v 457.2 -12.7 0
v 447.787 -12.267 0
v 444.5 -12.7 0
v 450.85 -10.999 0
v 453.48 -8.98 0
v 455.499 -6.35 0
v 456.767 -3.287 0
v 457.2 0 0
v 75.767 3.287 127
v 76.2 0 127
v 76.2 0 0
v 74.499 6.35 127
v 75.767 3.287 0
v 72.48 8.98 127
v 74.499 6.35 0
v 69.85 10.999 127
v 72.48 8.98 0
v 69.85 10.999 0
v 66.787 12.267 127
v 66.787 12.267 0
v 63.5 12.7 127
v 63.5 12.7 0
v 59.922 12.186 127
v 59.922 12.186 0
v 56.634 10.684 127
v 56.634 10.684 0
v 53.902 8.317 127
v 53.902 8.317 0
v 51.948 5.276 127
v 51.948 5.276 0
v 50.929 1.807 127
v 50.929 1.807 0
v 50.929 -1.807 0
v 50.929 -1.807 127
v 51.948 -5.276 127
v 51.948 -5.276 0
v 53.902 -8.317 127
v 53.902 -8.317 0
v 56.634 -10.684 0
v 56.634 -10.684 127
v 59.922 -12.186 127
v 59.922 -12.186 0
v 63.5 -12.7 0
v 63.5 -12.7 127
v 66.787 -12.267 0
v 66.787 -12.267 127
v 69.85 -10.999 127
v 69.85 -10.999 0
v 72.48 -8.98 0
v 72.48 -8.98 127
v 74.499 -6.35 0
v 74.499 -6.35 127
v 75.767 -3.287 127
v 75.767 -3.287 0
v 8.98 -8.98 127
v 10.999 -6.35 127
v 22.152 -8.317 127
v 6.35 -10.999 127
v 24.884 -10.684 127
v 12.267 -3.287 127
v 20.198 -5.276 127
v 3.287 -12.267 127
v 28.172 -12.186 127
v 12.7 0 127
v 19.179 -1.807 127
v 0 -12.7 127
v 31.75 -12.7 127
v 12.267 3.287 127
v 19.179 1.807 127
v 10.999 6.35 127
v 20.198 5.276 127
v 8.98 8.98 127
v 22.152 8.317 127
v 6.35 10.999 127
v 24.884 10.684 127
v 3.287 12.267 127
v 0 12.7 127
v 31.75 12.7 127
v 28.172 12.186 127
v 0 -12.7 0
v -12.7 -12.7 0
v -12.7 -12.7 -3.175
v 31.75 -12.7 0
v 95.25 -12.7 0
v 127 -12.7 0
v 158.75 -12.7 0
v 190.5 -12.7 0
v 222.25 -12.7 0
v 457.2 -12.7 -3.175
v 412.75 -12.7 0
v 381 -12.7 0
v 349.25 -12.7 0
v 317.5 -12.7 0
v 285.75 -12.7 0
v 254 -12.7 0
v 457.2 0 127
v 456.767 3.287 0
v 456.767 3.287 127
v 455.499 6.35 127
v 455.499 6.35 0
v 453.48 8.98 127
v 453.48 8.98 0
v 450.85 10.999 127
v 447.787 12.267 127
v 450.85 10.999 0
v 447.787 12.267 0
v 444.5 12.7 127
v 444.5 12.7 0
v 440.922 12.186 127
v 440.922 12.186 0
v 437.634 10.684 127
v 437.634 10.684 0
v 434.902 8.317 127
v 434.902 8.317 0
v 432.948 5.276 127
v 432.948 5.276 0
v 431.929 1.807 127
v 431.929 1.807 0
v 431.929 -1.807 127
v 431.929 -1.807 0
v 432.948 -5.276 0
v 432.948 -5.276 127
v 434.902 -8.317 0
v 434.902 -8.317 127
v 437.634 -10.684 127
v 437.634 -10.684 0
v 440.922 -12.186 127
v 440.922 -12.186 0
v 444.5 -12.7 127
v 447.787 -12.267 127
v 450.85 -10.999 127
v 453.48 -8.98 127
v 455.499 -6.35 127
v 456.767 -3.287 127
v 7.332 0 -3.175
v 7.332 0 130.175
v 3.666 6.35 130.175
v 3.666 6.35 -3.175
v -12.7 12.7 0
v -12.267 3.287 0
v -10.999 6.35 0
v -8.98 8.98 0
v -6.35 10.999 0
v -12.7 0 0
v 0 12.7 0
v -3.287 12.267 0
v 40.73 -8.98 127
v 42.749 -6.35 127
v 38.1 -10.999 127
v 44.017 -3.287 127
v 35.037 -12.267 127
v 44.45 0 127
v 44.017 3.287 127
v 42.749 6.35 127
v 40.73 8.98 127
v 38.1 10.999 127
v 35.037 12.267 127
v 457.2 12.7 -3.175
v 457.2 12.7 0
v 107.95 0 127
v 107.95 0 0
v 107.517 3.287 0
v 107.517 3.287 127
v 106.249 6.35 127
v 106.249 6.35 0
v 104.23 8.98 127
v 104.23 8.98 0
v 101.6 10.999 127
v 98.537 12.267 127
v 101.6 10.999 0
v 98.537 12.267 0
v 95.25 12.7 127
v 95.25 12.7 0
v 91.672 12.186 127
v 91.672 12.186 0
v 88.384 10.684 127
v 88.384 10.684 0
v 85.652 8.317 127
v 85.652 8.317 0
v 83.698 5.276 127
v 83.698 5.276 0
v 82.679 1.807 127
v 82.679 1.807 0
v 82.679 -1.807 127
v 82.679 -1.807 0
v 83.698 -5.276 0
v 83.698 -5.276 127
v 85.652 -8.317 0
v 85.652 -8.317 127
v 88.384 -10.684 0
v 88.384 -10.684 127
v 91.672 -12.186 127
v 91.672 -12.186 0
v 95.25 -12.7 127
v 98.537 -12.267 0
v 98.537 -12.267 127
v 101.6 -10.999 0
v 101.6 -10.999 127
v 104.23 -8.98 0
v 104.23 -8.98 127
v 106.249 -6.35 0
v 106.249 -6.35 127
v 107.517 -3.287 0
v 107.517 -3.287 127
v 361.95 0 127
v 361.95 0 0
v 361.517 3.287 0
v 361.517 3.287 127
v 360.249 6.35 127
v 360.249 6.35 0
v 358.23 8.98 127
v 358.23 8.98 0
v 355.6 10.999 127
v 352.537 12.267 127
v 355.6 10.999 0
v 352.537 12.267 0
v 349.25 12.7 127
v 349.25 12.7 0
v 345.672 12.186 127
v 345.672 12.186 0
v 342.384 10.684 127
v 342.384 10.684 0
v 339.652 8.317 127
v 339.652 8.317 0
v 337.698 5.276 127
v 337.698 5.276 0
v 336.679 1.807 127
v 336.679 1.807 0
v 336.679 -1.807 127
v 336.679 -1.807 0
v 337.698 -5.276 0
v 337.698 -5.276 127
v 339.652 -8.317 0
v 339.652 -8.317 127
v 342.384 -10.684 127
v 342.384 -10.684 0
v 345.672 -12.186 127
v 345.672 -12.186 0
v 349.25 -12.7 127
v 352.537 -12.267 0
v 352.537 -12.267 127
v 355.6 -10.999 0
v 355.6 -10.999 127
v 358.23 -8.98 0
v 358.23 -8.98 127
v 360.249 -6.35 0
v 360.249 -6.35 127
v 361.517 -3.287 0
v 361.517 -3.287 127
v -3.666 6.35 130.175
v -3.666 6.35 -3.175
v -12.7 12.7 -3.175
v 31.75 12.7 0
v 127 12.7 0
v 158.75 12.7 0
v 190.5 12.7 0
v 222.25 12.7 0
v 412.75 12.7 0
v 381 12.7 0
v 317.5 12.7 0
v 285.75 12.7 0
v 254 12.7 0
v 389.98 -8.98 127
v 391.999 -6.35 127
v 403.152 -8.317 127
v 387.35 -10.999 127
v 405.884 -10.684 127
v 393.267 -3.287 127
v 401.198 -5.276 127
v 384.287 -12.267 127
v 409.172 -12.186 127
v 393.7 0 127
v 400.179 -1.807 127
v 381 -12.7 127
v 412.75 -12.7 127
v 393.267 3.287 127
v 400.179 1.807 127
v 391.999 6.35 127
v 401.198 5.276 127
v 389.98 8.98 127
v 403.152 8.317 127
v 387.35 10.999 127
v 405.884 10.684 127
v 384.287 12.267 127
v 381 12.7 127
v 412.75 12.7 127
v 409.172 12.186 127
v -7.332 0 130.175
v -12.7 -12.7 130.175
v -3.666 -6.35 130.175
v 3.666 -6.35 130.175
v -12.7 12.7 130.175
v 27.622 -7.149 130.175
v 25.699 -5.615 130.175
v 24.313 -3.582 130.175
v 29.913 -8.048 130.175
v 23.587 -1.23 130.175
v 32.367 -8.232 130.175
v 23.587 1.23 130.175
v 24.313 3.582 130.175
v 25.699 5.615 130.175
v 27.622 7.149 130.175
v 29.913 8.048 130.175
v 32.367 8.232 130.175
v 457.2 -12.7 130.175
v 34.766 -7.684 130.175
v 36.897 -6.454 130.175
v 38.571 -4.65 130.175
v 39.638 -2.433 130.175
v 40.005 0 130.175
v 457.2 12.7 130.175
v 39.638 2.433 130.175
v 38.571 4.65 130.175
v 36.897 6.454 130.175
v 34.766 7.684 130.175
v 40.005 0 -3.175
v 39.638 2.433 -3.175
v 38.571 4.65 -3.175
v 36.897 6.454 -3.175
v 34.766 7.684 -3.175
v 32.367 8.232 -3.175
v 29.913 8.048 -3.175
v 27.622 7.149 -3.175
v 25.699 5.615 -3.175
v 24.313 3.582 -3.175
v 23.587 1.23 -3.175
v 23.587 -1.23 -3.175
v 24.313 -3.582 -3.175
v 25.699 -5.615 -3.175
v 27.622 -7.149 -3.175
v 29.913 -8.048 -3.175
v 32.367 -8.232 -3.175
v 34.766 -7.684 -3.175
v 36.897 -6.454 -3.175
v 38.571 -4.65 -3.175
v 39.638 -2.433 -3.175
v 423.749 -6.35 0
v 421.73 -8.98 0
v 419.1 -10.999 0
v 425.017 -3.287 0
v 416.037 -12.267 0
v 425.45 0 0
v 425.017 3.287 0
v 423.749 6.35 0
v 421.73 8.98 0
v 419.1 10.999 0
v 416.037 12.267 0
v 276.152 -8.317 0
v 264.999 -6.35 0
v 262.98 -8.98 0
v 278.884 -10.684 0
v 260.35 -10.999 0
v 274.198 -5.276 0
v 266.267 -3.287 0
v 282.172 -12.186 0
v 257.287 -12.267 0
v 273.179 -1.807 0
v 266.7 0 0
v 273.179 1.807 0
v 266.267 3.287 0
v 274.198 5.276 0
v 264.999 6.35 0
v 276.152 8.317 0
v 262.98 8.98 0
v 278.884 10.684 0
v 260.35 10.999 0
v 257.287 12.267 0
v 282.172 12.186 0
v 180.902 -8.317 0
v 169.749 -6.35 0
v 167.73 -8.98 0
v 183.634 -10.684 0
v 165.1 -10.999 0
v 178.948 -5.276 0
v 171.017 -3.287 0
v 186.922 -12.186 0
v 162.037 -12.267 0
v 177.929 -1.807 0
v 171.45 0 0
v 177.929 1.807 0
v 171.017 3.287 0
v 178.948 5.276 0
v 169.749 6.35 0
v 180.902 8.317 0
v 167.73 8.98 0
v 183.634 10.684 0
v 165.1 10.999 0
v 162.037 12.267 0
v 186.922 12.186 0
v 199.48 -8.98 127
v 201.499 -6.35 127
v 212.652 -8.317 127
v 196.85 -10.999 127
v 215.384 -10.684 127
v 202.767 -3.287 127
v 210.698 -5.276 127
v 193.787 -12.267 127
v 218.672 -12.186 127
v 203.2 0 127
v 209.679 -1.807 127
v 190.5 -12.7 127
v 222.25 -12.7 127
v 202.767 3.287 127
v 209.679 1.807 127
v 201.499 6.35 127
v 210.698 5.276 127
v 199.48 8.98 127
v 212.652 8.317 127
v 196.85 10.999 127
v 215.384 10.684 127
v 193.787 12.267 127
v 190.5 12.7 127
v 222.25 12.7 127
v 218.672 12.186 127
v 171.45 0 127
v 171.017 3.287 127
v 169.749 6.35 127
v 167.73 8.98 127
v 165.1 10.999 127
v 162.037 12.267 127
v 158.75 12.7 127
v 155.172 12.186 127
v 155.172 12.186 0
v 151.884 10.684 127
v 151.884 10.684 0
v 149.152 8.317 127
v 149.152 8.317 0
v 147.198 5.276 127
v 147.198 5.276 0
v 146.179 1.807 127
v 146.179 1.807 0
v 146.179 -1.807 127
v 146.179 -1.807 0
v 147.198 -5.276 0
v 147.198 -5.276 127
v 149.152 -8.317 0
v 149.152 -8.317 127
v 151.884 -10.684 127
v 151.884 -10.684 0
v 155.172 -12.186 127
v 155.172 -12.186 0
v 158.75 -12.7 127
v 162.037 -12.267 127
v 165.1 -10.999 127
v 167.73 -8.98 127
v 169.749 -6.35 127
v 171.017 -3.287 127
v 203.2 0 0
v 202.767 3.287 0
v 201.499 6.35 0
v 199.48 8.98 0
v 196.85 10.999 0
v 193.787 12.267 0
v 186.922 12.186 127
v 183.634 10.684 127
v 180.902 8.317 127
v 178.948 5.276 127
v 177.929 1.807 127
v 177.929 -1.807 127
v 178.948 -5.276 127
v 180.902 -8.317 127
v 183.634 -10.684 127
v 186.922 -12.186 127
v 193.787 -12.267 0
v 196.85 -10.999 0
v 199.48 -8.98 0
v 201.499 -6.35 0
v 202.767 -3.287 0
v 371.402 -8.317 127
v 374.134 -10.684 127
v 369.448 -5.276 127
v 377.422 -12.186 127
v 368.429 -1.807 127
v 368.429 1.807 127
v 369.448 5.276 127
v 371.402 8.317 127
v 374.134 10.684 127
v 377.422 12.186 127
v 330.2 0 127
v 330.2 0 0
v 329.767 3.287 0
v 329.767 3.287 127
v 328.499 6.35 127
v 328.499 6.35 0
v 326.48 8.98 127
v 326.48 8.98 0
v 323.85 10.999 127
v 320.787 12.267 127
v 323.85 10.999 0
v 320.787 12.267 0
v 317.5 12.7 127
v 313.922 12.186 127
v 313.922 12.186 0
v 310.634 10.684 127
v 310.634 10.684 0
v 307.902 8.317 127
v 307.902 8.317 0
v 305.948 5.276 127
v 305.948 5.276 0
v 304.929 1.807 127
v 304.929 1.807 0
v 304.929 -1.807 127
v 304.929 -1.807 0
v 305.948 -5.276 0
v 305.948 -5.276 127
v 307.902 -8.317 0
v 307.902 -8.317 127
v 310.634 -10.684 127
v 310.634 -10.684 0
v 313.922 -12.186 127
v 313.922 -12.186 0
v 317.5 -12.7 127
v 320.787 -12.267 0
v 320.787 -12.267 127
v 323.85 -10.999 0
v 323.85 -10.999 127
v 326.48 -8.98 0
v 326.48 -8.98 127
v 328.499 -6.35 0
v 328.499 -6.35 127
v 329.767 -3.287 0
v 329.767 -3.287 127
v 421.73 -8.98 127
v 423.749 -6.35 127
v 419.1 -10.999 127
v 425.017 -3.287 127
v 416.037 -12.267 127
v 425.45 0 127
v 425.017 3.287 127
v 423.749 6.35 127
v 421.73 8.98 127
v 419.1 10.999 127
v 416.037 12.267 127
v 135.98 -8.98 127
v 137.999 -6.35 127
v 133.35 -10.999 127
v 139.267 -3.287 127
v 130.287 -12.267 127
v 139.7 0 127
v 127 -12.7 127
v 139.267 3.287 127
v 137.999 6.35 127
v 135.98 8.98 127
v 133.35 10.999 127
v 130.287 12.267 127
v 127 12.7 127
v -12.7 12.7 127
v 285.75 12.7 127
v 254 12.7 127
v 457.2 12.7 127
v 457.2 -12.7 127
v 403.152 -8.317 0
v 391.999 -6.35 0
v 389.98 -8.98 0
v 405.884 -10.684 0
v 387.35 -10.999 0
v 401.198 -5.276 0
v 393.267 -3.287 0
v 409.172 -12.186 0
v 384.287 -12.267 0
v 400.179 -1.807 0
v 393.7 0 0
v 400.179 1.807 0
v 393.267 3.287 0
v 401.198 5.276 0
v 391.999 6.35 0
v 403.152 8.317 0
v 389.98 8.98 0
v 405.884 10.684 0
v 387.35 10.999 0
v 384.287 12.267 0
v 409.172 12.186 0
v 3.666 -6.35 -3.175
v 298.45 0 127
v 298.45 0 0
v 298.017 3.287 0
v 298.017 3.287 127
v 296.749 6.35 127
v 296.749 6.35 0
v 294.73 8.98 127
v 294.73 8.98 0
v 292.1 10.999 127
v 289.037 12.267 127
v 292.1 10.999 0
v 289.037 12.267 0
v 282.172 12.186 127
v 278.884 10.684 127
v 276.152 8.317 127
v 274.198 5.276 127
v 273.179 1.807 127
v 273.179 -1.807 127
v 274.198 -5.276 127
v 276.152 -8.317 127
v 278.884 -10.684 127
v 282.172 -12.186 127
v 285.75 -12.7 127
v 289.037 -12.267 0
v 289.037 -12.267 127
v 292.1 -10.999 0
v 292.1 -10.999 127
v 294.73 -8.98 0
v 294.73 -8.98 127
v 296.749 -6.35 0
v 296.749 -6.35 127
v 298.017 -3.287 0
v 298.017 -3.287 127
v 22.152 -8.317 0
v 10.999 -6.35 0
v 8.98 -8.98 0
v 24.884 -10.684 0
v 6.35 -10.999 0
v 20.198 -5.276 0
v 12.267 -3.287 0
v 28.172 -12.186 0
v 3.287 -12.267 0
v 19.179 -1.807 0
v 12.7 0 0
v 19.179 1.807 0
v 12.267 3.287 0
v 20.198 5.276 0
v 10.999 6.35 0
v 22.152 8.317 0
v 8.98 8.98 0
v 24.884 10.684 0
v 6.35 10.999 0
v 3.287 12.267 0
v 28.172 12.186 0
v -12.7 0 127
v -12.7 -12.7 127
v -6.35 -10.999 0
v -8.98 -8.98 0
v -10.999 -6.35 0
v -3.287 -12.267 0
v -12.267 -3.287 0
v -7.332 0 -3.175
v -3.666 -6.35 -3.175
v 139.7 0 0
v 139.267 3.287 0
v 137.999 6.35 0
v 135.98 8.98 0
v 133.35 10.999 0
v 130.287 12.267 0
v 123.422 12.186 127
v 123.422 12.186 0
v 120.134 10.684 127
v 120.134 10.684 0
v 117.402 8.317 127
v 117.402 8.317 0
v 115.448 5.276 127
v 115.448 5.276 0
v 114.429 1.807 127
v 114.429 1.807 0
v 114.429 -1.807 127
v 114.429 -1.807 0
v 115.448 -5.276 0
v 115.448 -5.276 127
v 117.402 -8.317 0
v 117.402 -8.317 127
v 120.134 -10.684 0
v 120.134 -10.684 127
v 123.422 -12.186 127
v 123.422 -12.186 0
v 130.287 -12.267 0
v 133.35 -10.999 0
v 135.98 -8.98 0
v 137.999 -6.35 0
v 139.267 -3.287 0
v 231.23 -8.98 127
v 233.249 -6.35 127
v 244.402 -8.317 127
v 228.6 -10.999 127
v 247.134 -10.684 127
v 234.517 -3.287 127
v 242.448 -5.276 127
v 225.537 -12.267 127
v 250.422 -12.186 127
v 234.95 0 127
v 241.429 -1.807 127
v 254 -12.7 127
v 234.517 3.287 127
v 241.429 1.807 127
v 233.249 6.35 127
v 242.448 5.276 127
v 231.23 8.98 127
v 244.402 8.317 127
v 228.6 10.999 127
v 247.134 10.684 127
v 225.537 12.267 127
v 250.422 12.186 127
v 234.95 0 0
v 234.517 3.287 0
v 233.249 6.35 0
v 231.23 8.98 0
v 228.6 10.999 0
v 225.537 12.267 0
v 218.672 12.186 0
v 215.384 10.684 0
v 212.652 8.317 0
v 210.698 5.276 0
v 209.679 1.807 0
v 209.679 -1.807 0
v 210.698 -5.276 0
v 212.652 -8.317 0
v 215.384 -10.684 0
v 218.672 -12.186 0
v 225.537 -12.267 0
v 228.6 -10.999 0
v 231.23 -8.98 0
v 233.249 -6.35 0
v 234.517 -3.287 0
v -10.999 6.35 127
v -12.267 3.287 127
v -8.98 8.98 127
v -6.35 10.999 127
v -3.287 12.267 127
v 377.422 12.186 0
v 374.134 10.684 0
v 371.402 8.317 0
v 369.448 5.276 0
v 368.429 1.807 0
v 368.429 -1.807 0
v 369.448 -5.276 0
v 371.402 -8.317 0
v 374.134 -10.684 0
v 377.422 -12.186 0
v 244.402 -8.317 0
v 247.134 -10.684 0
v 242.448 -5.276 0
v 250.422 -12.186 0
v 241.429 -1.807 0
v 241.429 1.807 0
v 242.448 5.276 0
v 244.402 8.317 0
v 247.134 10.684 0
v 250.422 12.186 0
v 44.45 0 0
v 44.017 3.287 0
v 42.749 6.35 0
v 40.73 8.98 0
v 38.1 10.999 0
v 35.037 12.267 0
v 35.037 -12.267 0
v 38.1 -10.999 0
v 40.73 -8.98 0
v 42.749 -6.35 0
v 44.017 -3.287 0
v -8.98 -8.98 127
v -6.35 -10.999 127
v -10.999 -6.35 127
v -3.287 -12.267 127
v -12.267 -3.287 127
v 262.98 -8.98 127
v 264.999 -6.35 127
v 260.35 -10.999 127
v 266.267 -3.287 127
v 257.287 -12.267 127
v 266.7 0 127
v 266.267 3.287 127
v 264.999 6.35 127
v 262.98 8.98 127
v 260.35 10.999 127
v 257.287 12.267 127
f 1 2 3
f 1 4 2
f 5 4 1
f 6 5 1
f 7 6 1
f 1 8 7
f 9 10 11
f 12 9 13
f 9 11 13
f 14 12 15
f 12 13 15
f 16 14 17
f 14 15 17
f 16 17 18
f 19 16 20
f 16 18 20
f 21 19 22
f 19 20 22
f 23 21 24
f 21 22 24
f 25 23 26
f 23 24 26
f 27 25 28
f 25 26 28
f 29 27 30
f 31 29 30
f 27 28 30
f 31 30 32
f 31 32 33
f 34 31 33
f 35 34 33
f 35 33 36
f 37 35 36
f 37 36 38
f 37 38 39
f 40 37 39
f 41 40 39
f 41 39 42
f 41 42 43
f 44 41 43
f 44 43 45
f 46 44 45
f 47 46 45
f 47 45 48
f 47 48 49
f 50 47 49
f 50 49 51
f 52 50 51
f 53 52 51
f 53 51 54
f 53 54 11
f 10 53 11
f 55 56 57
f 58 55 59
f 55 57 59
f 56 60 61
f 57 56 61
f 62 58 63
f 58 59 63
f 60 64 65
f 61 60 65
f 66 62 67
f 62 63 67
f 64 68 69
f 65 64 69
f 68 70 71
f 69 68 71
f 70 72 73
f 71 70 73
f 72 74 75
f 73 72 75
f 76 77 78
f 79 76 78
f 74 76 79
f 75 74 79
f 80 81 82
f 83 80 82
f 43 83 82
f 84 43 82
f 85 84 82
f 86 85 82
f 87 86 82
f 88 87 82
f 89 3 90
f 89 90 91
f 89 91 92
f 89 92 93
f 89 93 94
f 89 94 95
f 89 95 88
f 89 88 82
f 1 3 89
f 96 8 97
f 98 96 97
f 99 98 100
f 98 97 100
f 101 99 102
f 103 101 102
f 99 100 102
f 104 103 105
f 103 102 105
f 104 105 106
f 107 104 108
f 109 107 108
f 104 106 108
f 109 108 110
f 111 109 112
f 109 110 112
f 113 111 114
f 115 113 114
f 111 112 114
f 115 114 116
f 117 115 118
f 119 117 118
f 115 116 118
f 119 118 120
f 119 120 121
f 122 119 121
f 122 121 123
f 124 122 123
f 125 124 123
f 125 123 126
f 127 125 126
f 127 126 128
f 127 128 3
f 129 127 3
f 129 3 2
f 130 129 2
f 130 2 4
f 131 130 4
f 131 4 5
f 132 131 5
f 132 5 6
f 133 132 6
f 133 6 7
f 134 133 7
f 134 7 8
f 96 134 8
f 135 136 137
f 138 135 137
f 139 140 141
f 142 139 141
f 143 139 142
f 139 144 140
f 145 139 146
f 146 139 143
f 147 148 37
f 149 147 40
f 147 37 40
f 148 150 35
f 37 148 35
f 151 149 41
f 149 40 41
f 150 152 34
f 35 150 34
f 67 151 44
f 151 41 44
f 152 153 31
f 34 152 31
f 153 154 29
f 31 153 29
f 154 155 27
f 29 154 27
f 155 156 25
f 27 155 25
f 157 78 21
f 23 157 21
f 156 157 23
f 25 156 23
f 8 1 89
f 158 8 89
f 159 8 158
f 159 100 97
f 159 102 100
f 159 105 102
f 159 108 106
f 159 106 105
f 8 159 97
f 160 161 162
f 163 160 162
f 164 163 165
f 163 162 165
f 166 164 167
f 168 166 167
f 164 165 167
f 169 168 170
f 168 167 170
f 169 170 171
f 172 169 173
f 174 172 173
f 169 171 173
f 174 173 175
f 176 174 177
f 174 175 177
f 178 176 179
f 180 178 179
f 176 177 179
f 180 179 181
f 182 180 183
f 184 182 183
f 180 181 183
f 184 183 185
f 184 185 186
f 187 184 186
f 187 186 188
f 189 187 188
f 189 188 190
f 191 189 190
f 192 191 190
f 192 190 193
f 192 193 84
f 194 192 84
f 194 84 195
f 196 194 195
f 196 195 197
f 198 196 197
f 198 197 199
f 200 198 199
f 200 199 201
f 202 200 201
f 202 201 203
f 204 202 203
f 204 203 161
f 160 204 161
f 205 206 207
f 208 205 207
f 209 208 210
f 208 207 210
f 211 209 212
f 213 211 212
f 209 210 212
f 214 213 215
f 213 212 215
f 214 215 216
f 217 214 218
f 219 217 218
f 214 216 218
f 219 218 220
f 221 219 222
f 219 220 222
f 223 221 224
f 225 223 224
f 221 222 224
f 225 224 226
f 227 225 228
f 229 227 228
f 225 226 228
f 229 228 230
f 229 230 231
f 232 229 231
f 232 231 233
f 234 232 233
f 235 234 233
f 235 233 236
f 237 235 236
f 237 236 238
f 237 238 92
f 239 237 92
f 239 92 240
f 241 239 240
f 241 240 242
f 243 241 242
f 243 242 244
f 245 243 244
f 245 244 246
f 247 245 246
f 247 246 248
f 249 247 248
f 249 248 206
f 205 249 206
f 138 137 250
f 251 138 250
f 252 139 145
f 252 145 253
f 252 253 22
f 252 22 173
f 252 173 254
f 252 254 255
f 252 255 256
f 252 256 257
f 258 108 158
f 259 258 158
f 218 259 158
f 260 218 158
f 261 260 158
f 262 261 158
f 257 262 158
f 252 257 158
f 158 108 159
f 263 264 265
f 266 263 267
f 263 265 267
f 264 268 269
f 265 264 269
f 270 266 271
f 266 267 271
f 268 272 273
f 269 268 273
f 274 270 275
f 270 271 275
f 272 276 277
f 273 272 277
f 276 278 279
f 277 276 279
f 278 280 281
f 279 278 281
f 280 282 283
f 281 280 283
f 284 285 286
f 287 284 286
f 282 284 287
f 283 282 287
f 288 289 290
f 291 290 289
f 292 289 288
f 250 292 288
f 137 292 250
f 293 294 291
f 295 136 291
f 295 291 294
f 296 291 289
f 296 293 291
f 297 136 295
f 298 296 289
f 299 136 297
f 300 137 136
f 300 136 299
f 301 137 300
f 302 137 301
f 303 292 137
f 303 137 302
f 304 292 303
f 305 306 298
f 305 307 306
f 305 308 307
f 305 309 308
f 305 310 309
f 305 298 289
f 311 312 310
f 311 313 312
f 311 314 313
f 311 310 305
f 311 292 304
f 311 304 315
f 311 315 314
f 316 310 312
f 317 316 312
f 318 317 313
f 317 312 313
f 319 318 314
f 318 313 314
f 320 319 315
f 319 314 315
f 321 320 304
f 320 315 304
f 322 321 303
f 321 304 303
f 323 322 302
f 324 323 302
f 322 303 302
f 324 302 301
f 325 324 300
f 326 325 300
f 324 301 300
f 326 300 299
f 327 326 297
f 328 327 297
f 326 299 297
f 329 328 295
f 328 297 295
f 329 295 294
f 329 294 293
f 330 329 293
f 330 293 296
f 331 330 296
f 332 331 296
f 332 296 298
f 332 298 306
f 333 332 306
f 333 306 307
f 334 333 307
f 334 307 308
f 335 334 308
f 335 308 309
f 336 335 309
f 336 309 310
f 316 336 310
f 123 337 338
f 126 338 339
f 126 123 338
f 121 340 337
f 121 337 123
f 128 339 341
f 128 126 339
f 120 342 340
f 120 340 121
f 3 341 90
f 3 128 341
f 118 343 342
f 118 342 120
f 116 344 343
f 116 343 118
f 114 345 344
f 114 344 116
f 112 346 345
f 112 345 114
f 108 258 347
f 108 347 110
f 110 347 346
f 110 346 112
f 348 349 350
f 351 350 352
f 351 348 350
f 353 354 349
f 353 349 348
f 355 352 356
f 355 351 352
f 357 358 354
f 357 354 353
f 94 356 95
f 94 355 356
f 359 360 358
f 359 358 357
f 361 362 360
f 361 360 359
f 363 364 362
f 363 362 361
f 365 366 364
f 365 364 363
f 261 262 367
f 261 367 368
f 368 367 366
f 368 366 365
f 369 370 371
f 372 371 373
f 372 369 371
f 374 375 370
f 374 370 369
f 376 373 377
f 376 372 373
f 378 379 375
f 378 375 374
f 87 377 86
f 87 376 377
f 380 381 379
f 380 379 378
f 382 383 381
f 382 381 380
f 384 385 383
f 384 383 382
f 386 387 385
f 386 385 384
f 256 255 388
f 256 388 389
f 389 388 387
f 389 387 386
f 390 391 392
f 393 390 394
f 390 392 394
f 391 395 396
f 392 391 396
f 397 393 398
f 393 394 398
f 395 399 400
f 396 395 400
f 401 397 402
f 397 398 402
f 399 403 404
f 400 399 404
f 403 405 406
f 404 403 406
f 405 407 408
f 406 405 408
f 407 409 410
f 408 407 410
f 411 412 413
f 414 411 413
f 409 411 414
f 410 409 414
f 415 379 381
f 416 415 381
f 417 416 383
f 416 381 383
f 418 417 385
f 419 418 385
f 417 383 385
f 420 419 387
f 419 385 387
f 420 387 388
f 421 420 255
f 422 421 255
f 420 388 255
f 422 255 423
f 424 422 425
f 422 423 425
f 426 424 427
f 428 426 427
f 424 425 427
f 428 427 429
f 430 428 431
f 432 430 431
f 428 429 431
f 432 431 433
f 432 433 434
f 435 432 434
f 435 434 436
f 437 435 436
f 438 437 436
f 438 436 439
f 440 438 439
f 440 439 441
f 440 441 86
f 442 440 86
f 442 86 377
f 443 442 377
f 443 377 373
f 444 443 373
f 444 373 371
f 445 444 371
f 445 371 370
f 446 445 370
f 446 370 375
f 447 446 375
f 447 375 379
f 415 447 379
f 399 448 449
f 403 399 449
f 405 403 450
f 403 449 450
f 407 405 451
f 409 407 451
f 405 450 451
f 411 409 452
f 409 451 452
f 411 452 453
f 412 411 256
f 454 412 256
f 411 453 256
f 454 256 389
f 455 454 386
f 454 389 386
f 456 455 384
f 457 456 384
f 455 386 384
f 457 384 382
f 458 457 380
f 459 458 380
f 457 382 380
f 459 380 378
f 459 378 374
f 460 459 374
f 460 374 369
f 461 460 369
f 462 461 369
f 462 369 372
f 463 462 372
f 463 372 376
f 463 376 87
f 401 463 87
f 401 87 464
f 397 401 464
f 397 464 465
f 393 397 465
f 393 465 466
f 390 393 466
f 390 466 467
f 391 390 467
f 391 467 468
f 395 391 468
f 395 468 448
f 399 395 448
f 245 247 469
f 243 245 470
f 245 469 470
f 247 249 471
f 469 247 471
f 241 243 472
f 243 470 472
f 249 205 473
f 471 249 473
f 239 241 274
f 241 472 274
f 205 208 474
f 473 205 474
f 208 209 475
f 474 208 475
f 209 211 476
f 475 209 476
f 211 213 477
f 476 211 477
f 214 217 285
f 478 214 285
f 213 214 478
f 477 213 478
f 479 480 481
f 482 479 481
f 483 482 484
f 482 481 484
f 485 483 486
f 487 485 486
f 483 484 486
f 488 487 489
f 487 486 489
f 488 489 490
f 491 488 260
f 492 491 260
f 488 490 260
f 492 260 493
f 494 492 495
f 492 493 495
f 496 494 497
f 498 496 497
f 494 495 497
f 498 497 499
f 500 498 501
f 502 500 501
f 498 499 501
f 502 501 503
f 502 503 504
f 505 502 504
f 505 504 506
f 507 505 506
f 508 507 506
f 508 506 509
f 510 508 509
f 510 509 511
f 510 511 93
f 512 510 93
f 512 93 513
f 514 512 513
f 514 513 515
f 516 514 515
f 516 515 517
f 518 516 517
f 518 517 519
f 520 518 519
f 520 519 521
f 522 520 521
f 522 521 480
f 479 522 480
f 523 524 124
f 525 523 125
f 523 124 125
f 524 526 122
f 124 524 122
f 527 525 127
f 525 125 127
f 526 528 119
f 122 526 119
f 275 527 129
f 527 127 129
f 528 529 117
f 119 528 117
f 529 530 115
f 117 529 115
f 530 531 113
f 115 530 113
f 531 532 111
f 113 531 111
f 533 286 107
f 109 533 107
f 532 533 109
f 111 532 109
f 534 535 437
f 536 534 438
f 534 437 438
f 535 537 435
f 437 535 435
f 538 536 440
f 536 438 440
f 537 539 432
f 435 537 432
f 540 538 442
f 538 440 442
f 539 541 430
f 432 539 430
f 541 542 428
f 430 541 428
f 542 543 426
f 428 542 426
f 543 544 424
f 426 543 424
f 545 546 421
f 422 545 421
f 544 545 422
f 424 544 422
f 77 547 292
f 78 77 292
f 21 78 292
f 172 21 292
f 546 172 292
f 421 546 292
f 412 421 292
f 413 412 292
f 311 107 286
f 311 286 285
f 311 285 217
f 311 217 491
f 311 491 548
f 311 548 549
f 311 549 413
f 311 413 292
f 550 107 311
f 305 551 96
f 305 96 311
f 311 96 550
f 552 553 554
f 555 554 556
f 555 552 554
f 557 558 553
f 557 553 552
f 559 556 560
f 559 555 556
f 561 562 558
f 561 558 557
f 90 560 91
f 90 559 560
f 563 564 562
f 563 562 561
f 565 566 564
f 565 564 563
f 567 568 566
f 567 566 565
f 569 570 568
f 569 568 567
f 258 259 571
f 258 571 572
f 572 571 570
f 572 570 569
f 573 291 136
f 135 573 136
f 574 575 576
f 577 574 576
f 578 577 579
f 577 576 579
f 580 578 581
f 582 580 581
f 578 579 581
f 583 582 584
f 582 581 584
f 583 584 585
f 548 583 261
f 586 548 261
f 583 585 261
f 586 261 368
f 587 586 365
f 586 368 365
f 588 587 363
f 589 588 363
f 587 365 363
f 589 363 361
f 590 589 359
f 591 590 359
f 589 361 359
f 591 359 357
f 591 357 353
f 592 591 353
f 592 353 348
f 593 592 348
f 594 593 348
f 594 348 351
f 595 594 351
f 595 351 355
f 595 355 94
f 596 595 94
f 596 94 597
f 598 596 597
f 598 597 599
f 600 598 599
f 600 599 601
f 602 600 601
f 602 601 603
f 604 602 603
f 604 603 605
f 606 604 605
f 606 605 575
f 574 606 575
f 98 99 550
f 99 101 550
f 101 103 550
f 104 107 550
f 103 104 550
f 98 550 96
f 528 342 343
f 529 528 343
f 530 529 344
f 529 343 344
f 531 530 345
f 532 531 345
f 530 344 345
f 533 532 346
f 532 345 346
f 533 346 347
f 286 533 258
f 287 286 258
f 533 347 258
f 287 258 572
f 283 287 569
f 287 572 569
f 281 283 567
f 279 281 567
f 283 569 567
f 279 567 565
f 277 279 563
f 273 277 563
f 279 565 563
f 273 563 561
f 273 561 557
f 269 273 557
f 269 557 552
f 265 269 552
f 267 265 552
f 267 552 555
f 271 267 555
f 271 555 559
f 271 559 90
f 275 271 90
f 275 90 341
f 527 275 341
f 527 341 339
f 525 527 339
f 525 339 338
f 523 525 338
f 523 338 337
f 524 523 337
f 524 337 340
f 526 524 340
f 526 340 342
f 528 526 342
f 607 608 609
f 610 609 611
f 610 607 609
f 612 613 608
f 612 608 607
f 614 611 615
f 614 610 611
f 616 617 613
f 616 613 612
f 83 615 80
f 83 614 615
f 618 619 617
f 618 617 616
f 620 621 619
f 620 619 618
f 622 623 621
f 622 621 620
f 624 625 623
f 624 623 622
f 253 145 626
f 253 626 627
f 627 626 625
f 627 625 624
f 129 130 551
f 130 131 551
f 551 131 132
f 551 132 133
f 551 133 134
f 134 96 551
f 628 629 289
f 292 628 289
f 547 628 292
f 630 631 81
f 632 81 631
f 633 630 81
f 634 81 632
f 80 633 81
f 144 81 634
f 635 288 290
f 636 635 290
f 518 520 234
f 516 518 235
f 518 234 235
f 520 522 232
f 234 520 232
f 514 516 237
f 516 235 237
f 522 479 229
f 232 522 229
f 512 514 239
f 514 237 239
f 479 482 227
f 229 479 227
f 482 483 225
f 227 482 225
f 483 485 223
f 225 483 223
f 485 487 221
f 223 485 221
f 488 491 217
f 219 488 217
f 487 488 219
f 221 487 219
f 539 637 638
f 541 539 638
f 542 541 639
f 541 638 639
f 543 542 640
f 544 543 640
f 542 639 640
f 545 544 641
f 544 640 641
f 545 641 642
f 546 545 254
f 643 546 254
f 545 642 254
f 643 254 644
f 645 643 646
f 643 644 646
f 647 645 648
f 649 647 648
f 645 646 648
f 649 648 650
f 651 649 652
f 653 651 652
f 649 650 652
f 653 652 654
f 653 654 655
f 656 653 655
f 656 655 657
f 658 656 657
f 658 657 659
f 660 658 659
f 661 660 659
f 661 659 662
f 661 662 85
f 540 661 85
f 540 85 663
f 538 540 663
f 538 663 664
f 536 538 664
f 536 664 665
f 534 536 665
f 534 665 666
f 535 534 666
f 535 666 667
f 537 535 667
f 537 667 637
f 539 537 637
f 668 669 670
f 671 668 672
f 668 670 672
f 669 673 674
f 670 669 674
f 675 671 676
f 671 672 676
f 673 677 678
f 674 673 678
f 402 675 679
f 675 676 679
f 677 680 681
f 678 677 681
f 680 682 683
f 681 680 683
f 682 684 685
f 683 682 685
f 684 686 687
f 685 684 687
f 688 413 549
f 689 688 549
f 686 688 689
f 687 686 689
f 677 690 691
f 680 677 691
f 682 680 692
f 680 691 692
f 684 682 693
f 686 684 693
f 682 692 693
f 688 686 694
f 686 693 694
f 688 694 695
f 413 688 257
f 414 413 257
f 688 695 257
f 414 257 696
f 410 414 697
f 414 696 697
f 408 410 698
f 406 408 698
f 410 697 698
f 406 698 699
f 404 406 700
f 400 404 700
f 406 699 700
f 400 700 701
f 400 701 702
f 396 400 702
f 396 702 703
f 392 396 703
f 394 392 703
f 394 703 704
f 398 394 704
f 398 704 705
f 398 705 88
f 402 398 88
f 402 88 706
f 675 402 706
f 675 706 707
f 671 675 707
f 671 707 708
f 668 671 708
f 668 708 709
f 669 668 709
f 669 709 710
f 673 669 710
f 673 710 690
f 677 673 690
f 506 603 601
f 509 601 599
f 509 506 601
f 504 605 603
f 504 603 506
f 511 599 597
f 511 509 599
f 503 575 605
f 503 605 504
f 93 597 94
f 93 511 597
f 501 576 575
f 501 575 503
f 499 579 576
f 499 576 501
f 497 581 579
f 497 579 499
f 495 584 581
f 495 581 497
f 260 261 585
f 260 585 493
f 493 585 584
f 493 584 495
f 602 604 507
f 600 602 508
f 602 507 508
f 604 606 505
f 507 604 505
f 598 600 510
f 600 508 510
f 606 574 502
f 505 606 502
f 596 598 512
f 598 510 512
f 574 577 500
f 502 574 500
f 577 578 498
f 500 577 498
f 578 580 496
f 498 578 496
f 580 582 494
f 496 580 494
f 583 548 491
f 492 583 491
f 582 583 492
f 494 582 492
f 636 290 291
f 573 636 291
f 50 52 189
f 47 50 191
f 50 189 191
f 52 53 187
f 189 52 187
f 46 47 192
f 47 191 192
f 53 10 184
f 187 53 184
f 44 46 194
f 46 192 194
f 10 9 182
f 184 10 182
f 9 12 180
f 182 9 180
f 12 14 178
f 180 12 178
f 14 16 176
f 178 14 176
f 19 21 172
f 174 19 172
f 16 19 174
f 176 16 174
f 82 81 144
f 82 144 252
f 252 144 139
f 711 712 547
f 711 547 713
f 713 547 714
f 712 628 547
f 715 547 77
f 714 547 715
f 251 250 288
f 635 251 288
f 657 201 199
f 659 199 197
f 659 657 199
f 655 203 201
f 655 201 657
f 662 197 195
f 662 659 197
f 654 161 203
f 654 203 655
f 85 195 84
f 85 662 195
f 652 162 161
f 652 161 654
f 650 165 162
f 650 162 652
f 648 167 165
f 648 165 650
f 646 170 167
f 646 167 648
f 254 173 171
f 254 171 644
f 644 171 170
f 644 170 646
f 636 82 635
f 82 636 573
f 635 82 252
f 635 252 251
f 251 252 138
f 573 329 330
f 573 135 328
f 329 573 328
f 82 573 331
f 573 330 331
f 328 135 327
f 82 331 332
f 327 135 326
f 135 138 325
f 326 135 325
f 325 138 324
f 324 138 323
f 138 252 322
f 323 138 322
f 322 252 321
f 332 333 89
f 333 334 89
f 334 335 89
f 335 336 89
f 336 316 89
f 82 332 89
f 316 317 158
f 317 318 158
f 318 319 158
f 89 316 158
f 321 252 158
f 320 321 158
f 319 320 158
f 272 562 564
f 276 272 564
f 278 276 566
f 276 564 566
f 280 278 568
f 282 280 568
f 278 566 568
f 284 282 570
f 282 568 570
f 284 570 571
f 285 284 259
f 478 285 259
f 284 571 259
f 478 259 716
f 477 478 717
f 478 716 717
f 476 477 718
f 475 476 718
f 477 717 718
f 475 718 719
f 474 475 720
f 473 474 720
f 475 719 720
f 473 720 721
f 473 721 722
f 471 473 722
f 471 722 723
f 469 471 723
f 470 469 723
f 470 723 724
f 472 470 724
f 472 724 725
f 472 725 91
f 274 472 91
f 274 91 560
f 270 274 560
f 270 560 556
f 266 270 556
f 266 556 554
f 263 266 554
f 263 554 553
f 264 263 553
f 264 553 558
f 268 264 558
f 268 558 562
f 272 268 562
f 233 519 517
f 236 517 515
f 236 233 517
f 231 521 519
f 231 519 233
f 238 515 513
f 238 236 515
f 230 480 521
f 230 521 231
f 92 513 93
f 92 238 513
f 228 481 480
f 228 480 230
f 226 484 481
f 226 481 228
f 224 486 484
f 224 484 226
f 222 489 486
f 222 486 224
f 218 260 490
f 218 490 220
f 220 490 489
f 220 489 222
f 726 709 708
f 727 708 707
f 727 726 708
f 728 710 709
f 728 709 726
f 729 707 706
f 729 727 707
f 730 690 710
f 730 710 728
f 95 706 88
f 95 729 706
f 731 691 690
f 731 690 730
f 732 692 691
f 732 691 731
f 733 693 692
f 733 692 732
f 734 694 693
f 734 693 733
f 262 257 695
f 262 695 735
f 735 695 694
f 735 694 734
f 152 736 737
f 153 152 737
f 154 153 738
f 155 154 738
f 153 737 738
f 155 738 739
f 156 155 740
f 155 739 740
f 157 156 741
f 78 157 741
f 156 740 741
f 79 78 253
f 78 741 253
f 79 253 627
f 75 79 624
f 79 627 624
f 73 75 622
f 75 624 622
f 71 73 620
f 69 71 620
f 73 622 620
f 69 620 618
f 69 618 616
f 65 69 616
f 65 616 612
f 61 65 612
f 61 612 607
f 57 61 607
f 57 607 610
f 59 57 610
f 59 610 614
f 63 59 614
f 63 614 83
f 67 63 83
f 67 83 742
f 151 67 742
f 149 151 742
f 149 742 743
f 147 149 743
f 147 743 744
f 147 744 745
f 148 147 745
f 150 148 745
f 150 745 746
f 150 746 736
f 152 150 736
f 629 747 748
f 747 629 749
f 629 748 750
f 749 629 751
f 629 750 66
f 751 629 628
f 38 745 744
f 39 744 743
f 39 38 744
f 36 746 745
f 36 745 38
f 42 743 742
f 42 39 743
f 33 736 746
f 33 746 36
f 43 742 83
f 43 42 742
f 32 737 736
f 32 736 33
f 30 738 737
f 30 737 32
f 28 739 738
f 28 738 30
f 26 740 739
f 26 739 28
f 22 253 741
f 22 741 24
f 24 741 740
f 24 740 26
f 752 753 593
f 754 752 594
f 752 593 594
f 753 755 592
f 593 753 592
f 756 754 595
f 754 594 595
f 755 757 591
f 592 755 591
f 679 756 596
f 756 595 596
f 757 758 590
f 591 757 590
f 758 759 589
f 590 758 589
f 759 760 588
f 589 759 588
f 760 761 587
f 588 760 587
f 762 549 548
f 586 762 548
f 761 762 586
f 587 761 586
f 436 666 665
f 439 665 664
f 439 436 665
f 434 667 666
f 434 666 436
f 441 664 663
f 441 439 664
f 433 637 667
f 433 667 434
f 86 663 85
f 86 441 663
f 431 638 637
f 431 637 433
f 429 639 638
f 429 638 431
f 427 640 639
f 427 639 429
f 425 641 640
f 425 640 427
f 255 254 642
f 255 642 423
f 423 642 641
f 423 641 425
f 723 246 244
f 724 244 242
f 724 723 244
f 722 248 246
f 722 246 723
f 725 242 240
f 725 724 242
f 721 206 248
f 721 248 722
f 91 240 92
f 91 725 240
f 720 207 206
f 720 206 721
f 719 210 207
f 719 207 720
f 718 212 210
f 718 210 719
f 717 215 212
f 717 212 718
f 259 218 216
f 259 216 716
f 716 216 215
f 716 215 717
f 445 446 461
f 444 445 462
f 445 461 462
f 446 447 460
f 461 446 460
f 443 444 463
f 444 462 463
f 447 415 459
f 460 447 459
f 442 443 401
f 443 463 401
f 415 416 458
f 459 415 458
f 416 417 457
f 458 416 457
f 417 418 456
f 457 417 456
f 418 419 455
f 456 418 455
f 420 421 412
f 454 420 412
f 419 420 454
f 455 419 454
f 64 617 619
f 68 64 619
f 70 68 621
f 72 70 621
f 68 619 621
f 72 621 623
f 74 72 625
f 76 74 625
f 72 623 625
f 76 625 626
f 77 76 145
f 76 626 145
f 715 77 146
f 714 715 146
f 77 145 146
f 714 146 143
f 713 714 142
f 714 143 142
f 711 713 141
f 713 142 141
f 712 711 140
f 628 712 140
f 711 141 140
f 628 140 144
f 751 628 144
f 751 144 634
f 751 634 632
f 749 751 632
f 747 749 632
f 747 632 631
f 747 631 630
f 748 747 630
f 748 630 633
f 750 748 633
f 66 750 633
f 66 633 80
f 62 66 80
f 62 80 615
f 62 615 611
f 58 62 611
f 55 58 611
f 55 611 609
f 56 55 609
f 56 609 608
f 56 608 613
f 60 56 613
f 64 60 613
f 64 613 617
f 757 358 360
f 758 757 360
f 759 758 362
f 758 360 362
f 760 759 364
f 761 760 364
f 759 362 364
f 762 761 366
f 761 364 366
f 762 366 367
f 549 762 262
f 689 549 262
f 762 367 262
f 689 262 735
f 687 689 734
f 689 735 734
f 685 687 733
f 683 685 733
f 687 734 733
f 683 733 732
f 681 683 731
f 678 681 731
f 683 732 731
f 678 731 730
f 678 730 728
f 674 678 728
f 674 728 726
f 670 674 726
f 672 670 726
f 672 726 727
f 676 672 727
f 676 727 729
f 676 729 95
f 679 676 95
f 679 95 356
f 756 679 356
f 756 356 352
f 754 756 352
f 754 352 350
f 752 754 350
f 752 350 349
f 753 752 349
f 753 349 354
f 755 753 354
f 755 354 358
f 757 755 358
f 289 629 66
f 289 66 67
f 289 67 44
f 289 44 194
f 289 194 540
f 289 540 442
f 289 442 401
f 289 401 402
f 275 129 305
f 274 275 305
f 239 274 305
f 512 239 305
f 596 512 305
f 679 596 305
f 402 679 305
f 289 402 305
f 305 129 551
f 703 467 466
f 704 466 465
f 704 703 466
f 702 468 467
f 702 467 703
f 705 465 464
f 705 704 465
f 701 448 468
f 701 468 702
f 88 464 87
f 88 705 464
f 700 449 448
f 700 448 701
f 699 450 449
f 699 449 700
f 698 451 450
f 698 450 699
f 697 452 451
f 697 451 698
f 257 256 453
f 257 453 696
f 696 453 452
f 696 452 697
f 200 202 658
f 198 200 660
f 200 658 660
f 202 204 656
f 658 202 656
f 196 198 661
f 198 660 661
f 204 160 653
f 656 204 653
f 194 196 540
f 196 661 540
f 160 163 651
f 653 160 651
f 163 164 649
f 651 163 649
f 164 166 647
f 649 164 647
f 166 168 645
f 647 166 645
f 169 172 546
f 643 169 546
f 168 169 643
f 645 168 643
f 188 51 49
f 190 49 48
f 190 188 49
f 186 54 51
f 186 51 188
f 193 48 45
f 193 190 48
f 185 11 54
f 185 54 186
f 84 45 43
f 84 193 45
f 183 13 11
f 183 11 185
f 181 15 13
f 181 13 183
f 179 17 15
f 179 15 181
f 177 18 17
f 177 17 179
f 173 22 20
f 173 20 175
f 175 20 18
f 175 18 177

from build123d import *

# Parameters (mm, degrees)
SKETCH1_R           = 12.7
BOSS_EXTRUDE1_DEPTH = 127
LPATTERN1_COUNT     = 15
LPATTERN1_PITCH     = 31.75
SKETCH2_W           = 469.9
SKETCH2_H           = 25.4
BOSS_EXTRUDE2_DEPTH = 3.175
SKETCH3_R           = 8.255
CUT_EXTRUDE1_DEPTH  = 477.41930324


with BuildPart() as part:
    # Sketch1 → Boss-Extrude1 (new body)
    with BuildSketch(Plane.XY):
        Circle(SKETCH1_R)
    extrude(amount=BOSS_EXTRUDE1_DEPTH)


with BuildPart() as lpattern1_1:
    # LPattern1: pattern copy
    add(part.part.moved(Location(Vector(1, 0, 0) * (1 * LPATTERN1_PITCH))))


with BuildPart() as lpattern1_2:
    # LPattern1: pattern copy
    add(part.part.moved(Location(Vector(1, 0, 0) * (2 * LPATTERN1_PITCH))))


with BuildPart() as lpattern1_3:
    # LPattern1: pattern copy
    add(part.part.moved(Location(Vector(1, 0, 0) * (3 * LPATTERN1_PITCH))))


with BuildPart() as lpattern1_4:
    # LPattern1: pattern copy
    add(part.part.moved(Location(Vector(1, 0, 0) * (4 * LPATTERN1_PITCH))))


with BuildPart() as lpattern1_5:
    # LPattern1: pattern copy
    add(part.part.moved(Location(Vector(1, 0, 0) * (5 * LPATTERN1_PITCH))))


with BuildPart() as lpattern1_6:
    # LPattern1: pattern copy
    add(part.part.moved(Location(Vector(1, 0, 0) * (6 * LPATTERN1_PITCH))))


with BuildPart() as lpattern1_7:
    # LPattern1: pattern copy
    add(part.part.moved(Location(Vector(1, 0, 0) * (7 * LPATTERN1_PITCH))))


with BuildPart() as lpattern1_8:
    # LPattern1: pattern copy
    add(part.part.moved(Location(Vector(1, 0, 0) * (8 * LPATTERN1_PITCH))))


with BuildPart() as lpattern1_9:
    # LPattern1: pattern copy
    add(part.part.moved(Location(Vector(1, 0, 0) * (9 * LPATTERN1_PITCH))))


with BuildPart() as lpattern1_10:
    # LPattern1: pattern copy
    add(part.part.moved(Location(Vector(1, 0, 0) * (10 * LPATTERN1_PITCH))))


with BuildPart() as lpattern1_11:
    # LPattern1: pattern copy
    add(part.part.moved(Location(Vector(1, 0, 0) * (11 * LPATTERN1_PITCH))))


with BuildPart() as lpattern1_12:
    # LPattern1: pattern copy
    add(part.part.moved(Location(Vector(1, 0, 0) * (12 * LPATTERN1_PITCH))))


with BuildPart() as lpattern1_13:
    # LPattern1: pattern copy
    add(part.part.moved(Location(Vector(1, 0, 0) * (13 * LPATTERN1_PITCH))))


with BuildPart() as lpattern1_14:
    # LPattern1: pattern copy
    add(part.part.moved(Location(Vector(1, 0, 0) * (14 * LPATTERN1_PITCH))))


with BuildPart() as part_1:
    add(part.part)

    add(lpattern1_1.part)  # Boss-Extrude2 merges LPattern1_1

    add(lpattern1_2.part)  # Boss-Extrude2 merges LPattern1_2

    add(lpattern1_3.part)  # Boss-Extrude2 merges LPattern1_3

    add(lpattern1_4.part)  # Boss-Extrude2 merges LPattern1_4

    add(lpattern1_5.part)  # Boss-Extrude2 merges LPattern1_5

    add(lpattern1_6.part)  # Boss-Extrude2 merges LPattern1_6

    add(lpattern1_7.part)  # Boss-Extrude2 merges LPattern1_7

    add(lpattern1_8.part)  # Boss-Extrude2 merges LPattern1_8

    add(lpattern1_9.part)  # Boss-Extrude2 merges LPattern1_9

    add(lpattern1_10.part)  # Boss-Extrude2 merges LPattern1_10

    add(lpattern1_11.part)  # Boss-Extrude2 merges LPattern1_11

    add(lpattern1_12.part)  # Boss-Extrude2 merges LPattern1_12

    add(lpattern1_13.part)  # Boss-Extrude2 merges LPattern1_13

    add(lpattern1_14.part)  # Boss-Extrude2 merges LPattern1_14
    # Sketch2 → Boss-Extrude2 (add)
    with BuildSketch(Plane.XY.offset(127)):
        with Locations((222.25, 0)):
            Rectangle(SKETCH2_W, SKETCH2_H)
    boss_extrude2 = extrude(amount=BOSS_EXTRUDE2_DEPTH)

    # Mirror1: Boss-Extrude2 across plane
    add(boss_extrude2.mirror(Plane.XY.offset(63.5)))

    # Sketch3 → Cut-Extrude1 (cut, through all)
    with BuildSketch(Plane.XY.offset(130.175)):
        with Locations((31.75, 0)):
            Circle(SKETCH3_R)
        Polygon((7.332348419, 0), (3.666174209, 6.35), (-3.666174209, 6.35), (-7.332348419, 0), (-3.666174209, -6.35), (3.666174209, -6.35), align=None)
    extrude(amount=-CUT_EXTRUDE1_DEPTH, mode=Mode.SUBTRACT)


solid = part_1.part
